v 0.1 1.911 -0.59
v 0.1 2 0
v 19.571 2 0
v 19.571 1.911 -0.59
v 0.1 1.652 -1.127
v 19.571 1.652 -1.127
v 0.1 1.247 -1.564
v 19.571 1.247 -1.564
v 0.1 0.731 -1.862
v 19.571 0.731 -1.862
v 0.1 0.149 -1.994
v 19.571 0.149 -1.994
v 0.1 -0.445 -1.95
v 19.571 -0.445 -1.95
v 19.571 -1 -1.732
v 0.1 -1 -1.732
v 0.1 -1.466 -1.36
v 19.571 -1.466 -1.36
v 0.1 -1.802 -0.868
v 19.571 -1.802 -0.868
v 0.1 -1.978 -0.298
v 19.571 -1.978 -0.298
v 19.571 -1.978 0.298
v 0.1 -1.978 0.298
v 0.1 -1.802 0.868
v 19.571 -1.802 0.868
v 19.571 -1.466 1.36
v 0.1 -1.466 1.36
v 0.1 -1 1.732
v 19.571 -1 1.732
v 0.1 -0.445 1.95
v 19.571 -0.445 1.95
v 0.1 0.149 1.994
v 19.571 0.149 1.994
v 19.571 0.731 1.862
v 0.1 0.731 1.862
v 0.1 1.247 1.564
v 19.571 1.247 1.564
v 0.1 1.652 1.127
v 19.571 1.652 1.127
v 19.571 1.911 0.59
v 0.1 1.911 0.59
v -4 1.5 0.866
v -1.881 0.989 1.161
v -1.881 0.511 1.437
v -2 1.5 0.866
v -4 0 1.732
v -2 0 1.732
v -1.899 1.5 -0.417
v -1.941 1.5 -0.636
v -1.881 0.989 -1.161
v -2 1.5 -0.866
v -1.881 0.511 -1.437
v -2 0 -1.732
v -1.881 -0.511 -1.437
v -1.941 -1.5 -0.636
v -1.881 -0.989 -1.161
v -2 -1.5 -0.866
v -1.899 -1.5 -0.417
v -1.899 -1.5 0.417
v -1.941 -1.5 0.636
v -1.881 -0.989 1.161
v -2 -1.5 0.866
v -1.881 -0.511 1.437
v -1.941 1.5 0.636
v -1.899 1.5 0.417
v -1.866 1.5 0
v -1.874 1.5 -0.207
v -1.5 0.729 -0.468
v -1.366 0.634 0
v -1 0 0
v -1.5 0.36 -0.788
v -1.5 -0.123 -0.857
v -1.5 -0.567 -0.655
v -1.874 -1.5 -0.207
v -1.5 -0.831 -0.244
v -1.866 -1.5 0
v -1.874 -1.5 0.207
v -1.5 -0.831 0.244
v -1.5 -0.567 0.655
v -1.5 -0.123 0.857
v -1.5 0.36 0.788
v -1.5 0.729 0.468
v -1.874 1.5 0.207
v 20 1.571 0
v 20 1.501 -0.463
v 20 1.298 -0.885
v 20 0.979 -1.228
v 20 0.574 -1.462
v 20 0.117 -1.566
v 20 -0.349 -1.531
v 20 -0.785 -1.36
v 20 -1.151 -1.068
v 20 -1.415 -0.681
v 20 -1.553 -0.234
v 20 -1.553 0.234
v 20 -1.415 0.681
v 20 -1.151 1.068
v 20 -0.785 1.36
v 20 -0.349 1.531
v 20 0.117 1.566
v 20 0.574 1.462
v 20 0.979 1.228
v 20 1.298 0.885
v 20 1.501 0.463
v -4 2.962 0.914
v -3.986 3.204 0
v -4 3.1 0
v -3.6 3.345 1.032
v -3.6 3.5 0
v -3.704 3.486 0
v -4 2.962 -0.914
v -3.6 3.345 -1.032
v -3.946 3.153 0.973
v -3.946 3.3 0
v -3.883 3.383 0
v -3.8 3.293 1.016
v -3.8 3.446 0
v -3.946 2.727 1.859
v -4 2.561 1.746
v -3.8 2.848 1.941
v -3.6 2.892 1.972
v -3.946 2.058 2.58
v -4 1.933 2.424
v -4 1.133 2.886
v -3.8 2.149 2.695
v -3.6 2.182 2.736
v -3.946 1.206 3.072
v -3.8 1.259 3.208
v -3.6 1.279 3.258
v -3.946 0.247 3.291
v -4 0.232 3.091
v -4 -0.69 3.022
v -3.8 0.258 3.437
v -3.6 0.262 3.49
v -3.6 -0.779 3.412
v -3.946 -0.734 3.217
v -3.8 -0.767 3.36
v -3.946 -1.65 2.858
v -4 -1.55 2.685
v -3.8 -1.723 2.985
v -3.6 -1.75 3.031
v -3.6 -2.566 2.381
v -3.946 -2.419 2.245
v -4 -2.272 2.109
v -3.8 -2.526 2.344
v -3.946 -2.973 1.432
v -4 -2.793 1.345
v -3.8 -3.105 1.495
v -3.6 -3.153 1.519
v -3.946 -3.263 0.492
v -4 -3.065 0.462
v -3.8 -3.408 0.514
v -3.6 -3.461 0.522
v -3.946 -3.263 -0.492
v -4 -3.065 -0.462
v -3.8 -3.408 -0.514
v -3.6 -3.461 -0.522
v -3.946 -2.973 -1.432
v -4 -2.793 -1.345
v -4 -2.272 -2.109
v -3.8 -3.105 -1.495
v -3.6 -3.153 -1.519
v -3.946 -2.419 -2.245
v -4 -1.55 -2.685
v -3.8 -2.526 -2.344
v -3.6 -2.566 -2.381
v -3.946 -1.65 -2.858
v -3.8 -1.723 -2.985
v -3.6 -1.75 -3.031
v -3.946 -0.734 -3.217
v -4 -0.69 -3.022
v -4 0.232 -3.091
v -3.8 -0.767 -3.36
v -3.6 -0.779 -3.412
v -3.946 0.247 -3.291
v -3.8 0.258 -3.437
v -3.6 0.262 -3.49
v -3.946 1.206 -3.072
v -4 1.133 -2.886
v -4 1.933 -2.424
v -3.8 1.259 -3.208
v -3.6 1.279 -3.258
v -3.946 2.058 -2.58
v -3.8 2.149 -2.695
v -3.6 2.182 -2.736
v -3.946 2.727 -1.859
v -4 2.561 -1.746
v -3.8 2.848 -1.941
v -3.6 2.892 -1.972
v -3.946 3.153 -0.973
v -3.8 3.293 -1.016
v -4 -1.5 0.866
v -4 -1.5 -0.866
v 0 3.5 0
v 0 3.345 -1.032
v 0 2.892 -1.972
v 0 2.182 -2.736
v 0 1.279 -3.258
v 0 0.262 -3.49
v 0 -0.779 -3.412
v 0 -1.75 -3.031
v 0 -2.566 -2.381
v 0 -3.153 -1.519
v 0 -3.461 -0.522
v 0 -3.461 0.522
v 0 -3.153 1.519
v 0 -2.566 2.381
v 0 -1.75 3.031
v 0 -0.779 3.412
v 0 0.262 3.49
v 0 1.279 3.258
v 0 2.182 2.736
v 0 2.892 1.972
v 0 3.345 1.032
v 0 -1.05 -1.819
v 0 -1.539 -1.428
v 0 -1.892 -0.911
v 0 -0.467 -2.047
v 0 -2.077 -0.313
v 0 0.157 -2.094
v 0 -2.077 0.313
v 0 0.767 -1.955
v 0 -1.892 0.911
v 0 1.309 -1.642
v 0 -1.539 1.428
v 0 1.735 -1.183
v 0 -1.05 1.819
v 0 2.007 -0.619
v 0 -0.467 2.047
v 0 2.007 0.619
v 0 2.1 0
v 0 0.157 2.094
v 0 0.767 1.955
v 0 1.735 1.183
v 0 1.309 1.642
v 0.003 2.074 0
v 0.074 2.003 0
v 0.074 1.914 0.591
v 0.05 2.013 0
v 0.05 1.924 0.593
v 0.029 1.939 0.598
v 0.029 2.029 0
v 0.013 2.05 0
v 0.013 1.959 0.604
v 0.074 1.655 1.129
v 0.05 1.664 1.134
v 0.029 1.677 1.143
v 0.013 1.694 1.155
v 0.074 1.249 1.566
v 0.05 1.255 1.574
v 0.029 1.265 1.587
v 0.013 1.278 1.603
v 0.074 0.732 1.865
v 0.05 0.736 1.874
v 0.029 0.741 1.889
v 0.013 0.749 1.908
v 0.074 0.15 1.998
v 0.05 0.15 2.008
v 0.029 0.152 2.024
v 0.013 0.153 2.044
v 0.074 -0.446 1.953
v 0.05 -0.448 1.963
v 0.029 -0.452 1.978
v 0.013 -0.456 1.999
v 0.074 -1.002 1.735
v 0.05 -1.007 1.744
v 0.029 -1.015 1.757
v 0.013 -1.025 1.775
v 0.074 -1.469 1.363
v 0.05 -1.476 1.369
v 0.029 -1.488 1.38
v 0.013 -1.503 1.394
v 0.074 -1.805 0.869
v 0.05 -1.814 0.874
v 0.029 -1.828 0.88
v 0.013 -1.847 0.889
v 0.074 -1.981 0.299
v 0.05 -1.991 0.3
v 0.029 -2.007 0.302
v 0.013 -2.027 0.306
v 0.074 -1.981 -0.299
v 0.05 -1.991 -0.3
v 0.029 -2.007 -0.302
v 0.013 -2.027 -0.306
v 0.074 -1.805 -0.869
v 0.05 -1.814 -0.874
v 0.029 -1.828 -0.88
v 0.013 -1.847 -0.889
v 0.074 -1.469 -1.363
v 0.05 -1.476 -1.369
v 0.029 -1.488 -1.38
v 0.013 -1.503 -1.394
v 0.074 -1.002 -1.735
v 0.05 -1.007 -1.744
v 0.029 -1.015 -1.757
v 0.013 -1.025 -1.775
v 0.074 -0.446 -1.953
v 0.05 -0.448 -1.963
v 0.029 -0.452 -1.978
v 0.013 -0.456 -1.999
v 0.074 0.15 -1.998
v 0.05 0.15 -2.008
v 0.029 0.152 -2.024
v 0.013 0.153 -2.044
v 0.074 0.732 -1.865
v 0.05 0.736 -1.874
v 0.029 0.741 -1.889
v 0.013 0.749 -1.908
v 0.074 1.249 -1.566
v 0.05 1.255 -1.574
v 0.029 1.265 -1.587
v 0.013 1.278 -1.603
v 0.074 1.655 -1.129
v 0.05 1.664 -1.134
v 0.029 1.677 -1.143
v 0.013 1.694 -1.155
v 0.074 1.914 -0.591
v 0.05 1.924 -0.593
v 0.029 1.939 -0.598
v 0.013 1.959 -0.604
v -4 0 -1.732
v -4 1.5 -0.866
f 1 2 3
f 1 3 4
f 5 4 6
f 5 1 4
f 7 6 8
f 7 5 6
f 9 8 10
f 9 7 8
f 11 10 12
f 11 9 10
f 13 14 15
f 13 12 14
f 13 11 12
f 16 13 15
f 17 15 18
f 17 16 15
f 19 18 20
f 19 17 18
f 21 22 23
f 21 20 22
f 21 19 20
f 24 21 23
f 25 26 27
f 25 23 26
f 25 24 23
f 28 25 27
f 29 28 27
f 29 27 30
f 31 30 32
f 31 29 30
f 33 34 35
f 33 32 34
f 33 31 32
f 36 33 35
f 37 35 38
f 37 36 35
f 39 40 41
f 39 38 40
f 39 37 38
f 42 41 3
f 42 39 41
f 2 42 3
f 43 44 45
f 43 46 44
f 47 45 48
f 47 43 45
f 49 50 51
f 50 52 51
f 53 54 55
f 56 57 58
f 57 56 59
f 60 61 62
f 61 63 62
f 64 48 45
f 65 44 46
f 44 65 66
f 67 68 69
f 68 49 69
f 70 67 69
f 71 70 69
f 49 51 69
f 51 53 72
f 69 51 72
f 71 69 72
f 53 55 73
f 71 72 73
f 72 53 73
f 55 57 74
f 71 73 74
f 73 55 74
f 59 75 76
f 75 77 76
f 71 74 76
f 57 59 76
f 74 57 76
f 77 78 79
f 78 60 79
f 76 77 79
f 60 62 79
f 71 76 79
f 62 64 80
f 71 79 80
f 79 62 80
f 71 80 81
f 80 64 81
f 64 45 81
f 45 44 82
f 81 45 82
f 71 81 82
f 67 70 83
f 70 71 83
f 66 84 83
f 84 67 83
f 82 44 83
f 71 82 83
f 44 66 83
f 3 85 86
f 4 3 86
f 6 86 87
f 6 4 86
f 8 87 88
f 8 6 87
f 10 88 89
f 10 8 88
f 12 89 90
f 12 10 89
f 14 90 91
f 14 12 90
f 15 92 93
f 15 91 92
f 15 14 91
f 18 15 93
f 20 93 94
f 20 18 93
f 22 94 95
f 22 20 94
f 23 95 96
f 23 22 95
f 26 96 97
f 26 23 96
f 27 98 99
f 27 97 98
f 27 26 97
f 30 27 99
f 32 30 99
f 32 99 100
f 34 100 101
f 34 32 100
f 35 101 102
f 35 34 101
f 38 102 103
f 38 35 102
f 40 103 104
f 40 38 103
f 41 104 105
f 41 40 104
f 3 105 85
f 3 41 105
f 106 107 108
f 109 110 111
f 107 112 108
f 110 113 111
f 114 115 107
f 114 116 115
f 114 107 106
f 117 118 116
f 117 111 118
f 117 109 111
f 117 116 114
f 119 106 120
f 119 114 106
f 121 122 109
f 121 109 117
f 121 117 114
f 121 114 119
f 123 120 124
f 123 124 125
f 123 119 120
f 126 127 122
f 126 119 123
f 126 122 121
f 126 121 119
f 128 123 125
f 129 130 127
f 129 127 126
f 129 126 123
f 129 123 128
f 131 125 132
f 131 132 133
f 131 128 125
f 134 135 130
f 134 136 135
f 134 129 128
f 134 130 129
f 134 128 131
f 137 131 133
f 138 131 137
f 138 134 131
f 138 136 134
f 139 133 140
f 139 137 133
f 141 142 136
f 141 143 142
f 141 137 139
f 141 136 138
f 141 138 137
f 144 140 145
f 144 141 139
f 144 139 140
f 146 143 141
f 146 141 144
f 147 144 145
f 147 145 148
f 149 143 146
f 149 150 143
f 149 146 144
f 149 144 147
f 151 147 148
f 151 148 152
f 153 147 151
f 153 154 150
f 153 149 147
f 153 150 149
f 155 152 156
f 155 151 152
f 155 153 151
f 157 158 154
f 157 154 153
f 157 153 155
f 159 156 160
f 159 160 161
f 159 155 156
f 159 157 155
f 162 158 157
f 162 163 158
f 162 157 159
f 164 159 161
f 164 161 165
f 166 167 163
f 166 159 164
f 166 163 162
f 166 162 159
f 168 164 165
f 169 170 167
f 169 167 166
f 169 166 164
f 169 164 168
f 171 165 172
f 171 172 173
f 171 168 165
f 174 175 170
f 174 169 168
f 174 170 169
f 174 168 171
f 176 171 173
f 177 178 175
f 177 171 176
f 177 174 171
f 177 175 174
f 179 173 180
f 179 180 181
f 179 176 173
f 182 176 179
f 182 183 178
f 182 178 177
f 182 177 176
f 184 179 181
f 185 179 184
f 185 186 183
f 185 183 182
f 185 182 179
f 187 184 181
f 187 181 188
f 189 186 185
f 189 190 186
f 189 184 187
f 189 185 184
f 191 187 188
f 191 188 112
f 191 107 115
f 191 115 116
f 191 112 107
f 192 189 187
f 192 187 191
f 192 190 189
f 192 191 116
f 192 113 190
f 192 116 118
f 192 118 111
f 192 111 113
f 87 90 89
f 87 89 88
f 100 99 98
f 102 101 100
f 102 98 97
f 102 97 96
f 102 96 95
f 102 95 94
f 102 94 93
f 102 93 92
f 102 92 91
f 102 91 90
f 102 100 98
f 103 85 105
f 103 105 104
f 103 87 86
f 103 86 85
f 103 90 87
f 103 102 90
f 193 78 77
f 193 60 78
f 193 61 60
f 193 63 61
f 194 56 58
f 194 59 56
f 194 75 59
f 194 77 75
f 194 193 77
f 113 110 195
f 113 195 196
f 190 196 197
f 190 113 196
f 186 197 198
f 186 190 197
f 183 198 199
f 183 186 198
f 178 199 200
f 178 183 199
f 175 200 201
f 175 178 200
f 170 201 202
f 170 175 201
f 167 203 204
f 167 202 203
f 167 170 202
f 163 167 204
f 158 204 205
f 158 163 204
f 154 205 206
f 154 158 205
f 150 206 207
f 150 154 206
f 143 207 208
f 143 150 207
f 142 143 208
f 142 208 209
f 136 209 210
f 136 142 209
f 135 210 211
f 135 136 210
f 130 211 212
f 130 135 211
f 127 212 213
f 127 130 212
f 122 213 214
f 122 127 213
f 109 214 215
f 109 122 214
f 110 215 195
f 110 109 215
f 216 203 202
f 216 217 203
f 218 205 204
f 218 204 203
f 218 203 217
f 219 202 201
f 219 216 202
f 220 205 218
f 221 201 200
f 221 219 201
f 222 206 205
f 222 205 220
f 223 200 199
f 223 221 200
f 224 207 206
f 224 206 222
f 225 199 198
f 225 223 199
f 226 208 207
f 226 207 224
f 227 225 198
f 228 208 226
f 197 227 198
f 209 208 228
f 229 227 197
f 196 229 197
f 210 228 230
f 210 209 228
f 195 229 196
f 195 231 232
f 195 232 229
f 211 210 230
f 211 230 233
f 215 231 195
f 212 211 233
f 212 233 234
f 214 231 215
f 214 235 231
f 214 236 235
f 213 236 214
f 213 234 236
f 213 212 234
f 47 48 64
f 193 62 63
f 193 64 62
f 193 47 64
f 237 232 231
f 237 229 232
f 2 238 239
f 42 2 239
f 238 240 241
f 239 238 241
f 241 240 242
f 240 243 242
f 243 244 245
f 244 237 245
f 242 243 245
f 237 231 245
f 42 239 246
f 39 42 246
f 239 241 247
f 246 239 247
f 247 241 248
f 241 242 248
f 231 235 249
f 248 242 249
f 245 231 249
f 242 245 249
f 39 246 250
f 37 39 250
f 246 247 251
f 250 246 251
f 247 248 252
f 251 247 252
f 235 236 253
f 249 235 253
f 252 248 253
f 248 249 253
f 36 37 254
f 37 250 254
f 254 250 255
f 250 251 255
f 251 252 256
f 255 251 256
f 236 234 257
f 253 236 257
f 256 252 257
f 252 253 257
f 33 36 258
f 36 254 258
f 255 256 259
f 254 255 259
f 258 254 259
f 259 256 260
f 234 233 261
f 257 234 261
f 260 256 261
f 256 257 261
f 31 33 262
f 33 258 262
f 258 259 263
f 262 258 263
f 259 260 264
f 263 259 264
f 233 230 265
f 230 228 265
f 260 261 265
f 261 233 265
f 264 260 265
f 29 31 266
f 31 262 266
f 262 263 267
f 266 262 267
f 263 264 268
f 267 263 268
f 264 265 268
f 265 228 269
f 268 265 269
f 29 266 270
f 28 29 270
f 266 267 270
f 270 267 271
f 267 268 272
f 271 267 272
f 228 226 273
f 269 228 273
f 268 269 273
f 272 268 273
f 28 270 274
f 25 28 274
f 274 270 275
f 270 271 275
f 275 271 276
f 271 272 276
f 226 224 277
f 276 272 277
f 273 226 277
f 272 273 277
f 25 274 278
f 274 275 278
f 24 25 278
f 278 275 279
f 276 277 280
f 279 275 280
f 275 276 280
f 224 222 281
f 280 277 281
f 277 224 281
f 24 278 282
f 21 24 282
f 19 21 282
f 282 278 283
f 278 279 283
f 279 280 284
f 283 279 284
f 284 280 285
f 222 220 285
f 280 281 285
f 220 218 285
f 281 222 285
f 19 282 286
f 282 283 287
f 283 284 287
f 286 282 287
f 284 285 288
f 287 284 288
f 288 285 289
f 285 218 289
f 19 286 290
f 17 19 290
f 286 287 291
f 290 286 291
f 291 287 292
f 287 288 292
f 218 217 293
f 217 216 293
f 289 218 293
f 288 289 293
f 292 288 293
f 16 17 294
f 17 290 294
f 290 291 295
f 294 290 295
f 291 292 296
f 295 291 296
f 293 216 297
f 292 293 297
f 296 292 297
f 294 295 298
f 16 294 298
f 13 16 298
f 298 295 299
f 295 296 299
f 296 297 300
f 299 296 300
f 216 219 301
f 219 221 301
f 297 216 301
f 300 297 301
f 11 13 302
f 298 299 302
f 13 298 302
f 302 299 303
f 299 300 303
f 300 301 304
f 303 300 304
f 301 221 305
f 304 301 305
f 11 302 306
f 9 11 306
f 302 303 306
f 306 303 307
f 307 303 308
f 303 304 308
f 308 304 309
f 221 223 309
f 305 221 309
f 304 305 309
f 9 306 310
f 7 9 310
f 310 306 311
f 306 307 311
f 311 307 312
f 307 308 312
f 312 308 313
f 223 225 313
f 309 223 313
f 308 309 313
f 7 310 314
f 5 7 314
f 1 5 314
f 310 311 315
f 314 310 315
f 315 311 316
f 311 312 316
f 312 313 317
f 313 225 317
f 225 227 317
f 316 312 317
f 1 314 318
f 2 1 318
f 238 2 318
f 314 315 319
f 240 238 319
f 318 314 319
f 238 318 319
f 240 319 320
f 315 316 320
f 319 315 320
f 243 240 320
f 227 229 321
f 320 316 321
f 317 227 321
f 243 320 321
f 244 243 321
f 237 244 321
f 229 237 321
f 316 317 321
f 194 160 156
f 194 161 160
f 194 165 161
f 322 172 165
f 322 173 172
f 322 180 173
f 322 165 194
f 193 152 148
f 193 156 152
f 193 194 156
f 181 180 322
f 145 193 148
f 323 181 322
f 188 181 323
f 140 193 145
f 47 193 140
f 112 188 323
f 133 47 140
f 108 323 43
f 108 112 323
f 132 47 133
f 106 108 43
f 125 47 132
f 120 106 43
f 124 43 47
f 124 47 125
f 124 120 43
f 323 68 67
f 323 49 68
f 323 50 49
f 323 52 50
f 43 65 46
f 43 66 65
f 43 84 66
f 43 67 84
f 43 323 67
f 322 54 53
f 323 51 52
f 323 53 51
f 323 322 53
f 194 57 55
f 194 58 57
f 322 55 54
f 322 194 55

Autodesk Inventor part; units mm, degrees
ref_plane "YZ Plane" through (0, 0, 0) normal (1, 0, 0) x (0, 1, 0)
ref_plane "XZ Plane" through (0, 0, 0) normal (0, 1, 0) x (-1, 0, 0)
sketch "Sketch1" plane through (0, 0, 0) normal (0, 0, 1) x (1, 0, 0)
  line L0 (-1, 0) -> (20, 0)
  line L1 (20, 0) -> (20, 2)
  line L2 (20, 2) -> (6, 2)
  line L3 (6, 2) -> (5.5705, 2)
  line L4 (5.5705, 2) -> (0, 2)
  line L5 (0, 2) -> (0, 3.5)
  line L6 (0, 3.5) -> (-4, 3.5)
  line L7 (-4, 3.5) -> (-4, 1.7321)
  line L8 (-4, 1.7321) -> (-2, 1.7321)
  line L9 (-2, 1.7321) -> (-1, 0)
  line L10 (-8.8, 0) -> (24.8, 0) projected
  line L11 (0, -0.7) -> (0, 4.2) projected
  line L12 (6, 2) -> (0, 2) construction
  dimension "d1" = 14
  dimension "d2" = 0.4295
  dimension "d3" = 4
  dimension "d4" = 2
  dimension "d5" = 60
  dimension "d6" = 4
  dimension "d7" = 4
  dimension "d8" = 3.4641
  dimension "d9" = 7
  dimension "d26" = 20
revolve "Body" add sketch "Sketch1" angle 360 about axis through (-1, 0, 0) along (1, 0, 0)
sketch "Sketch2" plane through (-4, 0, 0) normal (-1, 0, 0) x (0, 0, 1)
  circle A0 centre (0, 0) radius 1.7321 projected
  line L0 (0, -4.9) -> (0, 4.9) projected
  line L1 (-4.9, 0) -> (4.9, 0) projected
  line L2 (1.7321, 0) -> (0.866, -1.5)
  line L3 (0.866, -1.5) -> (-0.866, -1.5)
  line L4 (-0.866, -1.5) -> (-1.7321, 0)
  line L5 (-1.7321, 0) -> (-0.866, 1.5)
  line L6 (-0.866, 1.5) -> (0.866, 1.5)
  line L7 (0.866, 1.5) -> (1.7321, 0)
extrude "Slot" add sketch "Sketch2" against normal up to next contours L7 A0 | A0 L2 | L6 L0 A0 | A0 L0 L3 | L0 L6 A0 | A0 L3 L0 | L4 A0 | A0 L5
fillet "Fillet1" radius 0.4 1 edges at (-4, -3.5, 0)
thread "Thread" size "M4x0.7" class "6g" standard "ISO Metric profile" length 14
chamfer "Chamfer1" distance 0.4294 distance2 0.4294 1 edges at (20, -2, 0) measured on face at (20, 0.527, -0.2661)
ref_plane "Work Plane1" through (29, 0, 0) normal (0, -1, 0) x (1, 0, 0)
fillet "Fillet2" radius 0.1 1 edges at (0, -2, 0)
equation "\"d1\" = GEL"
equation "\"d3\" = KOH"
equation "\"d4\" = INTI"
equation "\"d6\" = GD"
equation "\"d7\" = BDM"
equation "\"d8\" = 1.1547 * SW"
equation "\"d9\" = KOD"
equation "\"d26\" = NLG"
equation "\"d30\" = R"
equation "\"d17\" = RR"
equation "\"d13\" = GEL"
equation "\"d15\" = -0.5 * SPD + 0.5 * GD"
equation "\"d16\" = GUL"
equation "\"GD\" = NND"
equation "\"NLG\" = 20"
equation "\"GEL\" = 14"
equation "\"KOD\" = 7"
equation "\"KOH\" = NND"
equation "\"INTI\" = 2"
equation "\"GAL\" = 0.61345 * PTC"
equation "\"GUL\" = 0.61345 * PTC"
equation "\"BDM\" = NND"
equation "\"SW\" = 3"
equation "\"RR\" = 0.1 * NND"
equation "\"SPD\" = NND - 1.2269 * PTC"
equation "\"R\" = 0.1"
equation "\"PHH\" = 0.13"
equation "\"GD1\" = THREADDIA - 1.2269 * PTC"
equation "\"THREADDIA\" = 4"
equation "\"FAWI\" = 45deg"
equation "\"PTC\" = 0.7"
equation "\"KOH1\" = 3.6"
equation "\"NND\" = 4"
equation "\"TOA\" = 30deg"
equation "\"E0\" = 1.155 * SW"
properties part number "AS 1420 - 1973 - M4 x 20" material "Steel, Mild"
